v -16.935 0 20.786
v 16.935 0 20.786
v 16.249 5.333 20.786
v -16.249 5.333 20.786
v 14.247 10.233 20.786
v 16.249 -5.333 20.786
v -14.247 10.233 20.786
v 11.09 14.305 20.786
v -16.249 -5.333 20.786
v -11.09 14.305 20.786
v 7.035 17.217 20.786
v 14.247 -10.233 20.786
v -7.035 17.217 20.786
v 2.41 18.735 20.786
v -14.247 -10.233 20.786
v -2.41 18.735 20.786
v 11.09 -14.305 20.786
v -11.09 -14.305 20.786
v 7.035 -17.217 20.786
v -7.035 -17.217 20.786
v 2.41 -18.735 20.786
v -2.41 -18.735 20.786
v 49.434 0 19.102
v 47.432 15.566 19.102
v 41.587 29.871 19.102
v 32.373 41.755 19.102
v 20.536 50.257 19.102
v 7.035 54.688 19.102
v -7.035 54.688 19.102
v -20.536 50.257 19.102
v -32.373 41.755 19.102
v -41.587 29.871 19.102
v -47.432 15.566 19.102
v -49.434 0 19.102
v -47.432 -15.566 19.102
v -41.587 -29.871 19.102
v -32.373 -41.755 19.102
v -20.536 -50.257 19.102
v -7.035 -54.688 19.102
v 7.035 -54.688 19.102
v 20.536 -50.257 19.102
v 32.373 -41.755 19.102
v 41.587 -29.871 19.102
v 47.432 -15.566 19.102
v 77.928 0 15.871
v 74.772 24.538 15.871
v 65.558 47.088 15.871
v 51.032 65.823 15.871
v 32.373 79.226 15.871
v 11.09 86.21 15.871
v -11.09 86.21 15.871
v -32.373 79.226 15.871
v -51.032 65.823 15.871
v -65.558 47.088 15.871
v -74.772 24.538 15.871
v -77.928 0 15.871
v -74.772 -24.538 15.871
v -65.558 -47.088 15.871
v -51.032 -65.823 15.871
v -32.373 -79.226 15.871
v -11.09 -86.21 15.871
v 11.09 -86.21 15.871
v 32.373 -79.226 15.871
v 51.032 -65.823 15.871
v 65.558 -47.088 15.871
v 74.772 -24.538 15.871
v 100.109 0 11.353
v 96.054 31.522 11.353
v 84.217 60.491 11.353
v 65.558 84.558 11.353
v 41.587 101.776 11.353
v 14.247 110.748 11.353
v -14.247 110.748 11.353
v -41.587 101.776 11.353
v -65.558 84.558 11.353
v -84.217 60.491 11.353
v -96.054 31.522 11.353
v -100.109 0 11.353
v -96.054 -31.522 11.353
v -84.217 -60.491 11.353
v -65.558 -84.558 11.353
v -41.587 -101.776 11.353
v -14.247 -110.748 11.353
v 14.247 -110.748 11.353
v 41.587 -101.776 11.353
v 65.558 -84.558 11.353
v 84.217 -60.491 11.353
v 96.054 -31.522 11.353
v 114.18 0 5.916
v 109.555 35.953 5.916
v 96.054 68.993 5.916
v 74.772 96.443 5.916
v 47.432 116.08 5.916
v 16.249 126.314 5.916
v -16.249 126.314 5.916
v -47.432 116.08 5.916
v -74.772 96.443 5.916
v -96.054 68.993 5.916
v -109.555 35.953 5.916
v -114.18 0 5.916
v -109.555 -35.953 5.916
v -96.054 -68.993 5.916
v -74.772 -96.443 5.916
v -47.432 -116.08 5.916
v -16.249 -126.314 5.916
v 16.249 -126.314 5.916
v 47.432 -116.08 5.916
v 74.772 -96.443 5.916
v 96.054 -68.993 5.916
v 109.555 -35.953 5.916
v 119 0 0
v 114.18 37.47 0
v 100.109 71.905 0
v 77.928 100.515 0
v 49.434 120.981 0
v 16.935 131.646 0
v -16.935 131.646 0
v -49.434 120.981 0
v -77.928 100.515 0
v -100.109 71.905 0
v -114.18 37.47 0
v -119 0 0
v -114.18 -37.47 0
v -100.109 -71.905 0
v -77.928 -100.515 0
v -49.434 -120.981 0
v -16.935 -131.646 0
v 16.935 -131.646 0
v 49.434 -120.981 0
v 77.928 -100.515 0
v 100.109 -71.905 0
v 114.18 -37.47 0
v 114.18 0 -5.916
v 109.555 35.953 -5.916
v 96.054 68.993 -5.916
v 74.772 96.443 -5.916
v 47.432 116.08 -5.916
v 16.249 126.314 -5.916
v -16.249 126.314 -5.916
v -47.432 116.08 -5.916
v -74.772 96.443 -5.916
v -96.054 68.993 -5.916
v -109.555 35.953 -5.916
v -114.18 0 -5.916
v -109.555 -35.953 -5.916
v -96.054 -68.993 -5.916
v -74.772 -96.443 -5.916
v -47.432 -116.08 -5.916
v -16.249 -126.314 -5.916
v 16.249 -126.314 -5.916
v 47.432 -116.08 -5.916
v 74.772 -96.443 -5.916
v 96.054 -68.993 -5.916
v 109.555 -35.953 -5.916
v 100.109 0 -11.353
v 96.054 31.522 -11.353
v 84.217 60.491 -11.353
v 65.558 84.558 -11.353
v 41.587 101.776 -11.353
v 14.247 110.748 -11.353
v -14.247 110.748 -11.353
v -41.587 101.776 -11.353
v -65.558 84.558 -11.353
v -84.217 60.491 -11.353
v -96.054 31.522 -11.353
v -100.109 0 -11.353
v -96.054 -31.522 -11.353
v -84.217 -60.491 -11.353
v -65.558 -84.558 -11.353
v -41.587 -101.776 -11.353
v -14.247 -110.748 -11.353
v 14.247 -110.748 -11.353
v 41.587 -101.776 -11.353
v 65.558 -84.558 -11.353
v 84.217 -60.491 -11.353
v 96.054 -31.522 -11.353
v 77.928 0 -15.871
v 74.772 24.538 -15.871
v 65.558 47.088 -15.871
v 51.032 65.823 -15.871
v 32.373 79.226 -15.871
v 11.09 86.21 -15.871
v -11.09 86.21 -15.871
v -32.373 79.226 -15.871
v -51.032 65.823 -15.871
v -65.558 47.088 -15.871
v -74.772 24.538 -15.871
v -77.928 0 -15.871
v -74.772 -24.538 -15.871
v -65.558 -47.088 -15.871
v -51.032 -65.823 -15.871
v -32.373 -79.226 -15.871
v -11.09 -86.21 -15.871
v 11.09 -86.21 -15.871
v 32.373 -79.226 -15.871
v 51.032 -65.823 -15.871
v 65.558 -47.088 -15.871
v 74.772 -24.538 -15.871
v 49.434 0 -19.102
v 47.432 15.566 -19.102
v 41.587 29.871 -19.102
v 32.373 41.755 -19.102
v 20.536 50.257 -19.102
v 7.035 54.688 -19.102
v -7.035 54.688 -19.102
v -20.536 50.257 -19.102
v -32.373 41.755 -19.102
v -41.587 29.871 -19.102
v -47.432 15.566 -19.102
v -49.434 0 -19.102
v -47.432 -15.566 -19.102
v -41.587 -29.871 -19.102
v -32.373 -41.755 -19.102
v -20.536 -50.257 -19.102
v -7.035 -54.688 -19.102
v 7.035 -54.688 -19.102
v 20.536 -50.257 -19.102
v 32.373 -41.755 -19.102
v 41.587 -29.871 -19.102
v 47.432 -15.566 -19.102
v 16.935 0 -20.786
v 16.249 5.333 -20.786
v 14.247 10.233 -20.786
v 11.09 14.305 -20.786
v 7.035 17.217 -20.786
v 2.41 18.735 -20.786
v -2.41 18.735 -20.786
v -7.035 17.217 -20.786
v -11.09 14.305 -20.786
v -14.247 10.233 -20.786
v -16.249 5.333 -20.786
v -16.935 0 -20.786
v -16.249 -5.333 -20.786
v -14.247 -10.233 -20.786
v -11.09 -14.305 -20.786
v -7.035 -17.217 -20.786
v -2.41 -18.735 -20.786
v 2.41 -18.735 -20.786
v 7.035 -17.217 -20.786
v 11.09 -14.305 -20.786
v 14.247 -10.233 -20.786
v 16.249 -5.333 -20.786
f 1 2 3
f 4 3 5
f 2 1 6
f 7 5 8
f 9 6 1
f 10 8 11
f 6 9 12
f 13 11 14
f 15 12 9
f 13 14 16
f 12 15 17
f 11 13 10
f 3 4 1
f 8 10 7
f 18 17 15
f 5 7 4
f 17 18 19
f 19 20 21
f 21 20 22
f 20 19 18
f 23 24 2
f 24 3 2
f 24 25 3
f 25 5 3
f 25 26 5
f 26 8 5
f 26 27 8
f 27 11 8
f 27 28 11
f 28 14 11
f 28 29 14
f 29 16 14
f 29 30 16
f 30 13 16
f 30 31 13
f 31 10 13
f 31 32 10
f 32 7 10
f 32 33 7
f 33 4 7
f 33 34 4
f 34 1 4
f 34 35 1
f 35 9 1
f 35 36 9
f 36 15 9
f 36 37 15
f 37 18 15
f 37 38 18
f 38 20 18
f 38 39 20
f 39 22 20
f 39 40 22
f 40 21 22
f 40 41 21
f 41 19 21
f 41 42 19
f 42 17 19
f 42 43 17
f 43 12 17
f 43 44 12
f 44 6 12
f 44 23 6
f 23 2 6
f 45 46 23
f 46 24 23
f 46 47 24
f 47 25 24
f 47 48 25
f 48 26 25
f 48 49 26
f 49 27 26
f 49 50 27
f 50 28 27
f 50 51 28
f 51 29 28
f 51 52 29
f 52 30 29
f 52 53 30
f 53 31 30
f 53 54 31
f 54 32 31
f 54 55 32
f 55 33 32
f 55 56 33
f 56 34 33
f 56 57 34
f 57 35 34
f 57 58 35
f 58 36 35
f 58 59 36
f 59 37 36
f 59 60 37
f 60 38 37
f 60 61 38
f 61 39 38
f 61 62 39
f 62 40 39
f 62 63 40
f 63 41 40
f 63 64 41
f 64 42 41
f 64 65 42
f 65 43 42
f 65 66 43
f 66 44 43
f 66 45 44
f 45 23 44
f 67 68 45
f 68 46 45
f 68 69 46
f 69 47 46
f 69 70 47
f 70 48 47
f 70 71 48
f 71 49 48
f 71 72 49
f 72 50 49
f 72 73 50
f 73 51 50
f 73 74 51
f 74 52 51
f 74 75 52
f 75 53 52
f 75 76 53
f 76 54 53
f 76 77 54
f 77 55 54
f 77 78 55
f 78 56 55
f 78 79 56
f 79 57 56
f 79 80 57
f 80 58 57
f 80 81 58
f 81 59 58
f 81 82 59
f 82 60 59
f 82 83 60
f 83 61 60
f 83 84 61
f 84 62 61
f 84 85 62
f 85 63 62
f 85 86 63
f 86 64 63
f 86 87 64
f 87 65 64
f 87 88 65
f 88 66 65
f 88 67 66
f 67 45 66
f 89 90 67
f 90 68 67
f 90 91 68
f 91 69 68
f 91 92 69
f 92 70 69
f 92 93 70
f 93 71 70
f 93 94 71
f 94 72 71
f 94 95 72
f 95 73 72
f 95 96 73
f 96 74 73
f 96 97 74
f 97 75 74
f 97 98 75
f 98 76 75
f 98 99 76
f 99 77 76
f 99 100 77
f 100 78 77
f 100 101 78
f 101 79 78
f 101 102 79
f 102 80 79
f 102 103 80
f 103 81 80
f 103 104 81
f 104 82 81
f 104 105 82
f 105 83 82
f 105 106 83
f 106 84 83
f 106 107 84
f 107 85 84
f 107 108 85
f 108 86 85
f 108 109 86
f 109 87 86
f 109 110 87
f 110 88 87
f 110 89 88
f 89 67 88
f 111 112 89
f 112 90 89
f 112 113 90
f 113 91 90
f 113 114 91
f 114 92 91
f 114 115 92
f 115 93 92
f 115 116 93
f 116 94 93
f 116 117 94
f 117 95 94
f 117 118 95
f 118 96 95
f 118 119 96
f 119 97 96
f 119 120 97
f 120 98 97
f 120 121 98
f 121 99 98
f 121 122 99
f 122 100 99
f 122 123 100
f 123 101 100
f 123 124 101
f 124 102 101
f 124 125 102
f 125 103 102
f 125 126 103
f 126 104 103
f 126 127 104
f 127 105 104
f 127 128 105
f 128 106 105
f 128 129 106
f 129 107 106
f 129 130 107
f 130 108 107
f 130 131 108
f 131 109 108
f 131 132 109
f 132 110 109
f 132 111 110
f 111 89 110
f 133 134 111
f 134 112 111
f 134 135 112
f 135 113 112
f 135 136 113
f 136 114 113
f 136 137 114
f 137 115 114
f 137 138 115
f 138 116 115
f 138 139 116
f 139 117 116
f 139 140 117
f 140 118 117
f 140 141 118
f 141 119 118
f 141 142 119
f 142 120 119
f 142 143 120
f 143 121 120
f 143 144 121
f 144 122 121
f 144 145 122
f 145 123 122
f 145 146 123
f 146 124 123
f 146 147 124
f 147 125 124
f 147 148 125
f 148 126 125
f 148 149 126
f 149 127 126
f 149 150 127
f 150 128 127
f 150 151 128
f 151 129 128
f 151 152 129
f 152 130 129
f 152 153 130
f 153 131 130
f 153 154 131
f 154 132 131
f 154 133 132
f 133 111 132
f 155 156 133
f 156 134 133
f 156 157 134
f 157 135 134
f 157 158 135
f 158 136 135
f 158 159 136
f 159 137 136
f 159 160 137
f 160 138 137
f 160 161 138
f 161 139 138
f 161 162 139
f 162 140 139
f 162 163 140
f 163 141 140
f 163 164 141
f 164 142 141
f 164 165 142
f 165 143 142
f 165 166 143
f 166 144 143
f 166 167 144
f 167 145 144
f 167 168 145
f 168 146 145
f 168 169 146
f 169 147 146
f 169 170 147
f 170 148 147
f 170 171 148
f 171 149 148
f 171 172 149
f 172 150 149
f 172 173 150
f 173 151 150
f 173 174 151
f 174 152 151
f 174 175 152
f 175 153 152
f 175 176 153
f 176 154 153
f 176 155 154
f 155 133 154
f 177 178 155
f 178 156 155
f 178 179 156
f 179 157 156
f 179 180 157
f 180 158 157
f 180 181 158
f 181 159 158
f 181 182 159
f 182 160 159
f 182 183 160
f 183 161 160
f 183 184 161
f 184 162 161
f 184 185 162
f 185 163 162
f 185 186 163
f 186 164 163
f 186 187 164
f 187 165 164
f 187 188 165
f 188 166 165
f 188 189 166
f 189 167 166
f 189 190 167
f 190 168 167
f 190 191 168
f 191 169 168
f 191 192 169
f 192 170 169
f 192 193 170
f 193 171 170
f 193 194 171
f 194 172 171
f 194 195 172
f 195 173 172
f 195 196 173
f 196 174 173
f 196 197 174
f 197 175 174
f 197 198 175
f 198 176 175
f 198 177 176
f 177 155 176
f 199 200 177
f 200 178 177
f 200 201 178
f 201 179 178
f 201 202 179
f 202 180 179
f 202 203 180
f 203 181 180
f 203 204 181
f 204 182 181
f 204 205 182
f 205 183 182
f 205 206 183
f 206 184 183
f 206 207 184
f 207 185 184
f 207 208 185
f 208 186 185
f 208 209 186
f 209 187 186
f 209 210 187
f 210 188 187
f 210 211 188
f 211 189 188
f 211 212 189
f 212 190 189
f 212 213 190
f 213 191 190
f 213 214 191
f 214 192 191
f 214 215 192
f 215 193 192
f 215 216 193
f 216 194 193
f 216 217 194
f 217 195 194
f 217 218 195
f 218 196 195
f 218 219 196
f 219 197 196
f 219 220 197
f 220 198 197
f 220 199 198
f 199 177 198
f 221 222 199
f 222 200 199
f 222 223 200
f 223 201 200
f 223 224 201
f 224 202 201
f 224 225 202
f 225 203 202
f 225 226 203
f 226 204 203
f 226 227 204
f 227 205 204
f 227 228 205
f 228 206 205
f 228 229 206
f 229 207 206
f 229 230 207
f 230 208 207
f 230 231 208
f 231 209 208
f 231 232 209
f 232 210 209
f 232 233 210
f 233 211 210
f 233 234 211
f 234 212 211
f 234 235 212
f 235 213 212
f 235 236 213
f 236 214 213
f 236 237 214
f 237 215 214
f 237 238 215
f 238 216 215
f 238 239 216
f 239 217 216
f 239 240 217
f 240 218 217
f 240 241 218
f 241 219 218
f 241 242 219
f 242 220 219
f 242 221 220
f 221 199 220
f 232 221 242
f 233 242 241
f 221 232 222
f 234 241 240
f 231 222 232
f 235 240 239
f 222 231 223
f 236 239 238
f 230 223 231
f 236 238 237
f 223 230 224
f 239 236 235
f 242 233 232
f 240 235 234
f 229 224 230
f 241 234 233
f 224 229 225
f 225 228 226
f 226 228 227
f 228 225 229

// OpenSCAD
// Generated by SolidPython 1.0.1 on 2020-07-29 00:46:53


scale(v = [17, 19, 3]) {
	sphere(r = 7);
}
/***********************************************
*********      SolidPython code:      **********
************************************************
 
# import packages: SolidPython
from solid import *
from solid.utils import *
from itertools import chain, combinations, permutations


class Resize:

    def __init__(self, scad_file):
        self.scad_file = scad_file
        #self.scad_file = import_scad(scad_file)
        # cone/cylinder param:
        self.r1 = 0
        self.r2 = 0
        self.h = 0
        # rectangular prism param:
        self.w = 0
        self.l = 0
        # ellipse param:
        self.r = 0

    # import OpenScad code (file name corresponds to shape)


    # classify shape + parameters
    def assign(self, param1, param2, param3):
        if self.scad_file == 'cone.scad':
            self.r1 = param1
            self.r2 = param2
            self.h = param3
        elif self.scad_file == 'cylinder.scad':
            self.r1 = param1
            self.r2 = param2
            self.h = param3
        elif self.scad_file == 'rectangularPrism.scad':
            self.h = param1
            self.l = param2
            self.w = param3
        else:
            self.r = param1
            self.h = param2

    # resize parameters
    def iterate(self):
        x = range(3, 20, 2)
        i = 1
        if self.scad_file == 'cone.scad':
            tempList = list(permutations(x, 2))
            for temp in tempList:
                param1 = temp[0]
                param2 = temp[1]
                filepath = 'produced_scad_files/' + 'cone' + str(param1) + '_' + str(param2) + '_' + '.scad'
                scad_render_to_file(cylinder(h=param1, r1=param2, r2=0), filepath)

        elif self.scad_file == 'cylinder.scad':
            tempList = list(permutations(x, 3))
            for temp in tempList:
                param1 = temp[0]
                param2 = temp[1]
                filepath = 'produced_scad_files/' + 'cylinder' + str(param1) + '_' + str(param2) + '_' + '.scad'
                scad_render_to_file(cylinder(h=param1, r1=param2, r2=param2), filepath)

        elif self.scad_file == 'rectangularPrism.scad':
            tempList = list(permutations(x, 3))
            for temp in tempList:
                param1 = temp[0]
                param2 = temp[1]
                param3 = temp[2]
                filepath = 'produced_scad_files/' + 'rectangularPrism' + str(param1) + '_' + str(param2) + '_' + str(
                    param3) + '.scad'
                scad_render_to_file(cube(size=(param1, param2, param3)), filepath)

        elif self.scad_file == 'ellipse.scad':
            tempList = list(permutations(x, 4))
            for temp in tempList:
                param1 = temp[0]
                param2 = temp[1]
                param3 = temp[2]
                param4 = temp[3]
                filepath = 'produced_scad_files/' + 'ellipse' + str(param1) + '_' + str(param2) + '_' + str(param3) + '_' + str(param4) + '.scad'
                scad_render_to_file(scale([param1, param2, param3])(sphere(r=param4)), filepath)

    def render_to_scadfile(self):
        scad_render_to_file(scad, 'example.scad') 
 
************************************************/
